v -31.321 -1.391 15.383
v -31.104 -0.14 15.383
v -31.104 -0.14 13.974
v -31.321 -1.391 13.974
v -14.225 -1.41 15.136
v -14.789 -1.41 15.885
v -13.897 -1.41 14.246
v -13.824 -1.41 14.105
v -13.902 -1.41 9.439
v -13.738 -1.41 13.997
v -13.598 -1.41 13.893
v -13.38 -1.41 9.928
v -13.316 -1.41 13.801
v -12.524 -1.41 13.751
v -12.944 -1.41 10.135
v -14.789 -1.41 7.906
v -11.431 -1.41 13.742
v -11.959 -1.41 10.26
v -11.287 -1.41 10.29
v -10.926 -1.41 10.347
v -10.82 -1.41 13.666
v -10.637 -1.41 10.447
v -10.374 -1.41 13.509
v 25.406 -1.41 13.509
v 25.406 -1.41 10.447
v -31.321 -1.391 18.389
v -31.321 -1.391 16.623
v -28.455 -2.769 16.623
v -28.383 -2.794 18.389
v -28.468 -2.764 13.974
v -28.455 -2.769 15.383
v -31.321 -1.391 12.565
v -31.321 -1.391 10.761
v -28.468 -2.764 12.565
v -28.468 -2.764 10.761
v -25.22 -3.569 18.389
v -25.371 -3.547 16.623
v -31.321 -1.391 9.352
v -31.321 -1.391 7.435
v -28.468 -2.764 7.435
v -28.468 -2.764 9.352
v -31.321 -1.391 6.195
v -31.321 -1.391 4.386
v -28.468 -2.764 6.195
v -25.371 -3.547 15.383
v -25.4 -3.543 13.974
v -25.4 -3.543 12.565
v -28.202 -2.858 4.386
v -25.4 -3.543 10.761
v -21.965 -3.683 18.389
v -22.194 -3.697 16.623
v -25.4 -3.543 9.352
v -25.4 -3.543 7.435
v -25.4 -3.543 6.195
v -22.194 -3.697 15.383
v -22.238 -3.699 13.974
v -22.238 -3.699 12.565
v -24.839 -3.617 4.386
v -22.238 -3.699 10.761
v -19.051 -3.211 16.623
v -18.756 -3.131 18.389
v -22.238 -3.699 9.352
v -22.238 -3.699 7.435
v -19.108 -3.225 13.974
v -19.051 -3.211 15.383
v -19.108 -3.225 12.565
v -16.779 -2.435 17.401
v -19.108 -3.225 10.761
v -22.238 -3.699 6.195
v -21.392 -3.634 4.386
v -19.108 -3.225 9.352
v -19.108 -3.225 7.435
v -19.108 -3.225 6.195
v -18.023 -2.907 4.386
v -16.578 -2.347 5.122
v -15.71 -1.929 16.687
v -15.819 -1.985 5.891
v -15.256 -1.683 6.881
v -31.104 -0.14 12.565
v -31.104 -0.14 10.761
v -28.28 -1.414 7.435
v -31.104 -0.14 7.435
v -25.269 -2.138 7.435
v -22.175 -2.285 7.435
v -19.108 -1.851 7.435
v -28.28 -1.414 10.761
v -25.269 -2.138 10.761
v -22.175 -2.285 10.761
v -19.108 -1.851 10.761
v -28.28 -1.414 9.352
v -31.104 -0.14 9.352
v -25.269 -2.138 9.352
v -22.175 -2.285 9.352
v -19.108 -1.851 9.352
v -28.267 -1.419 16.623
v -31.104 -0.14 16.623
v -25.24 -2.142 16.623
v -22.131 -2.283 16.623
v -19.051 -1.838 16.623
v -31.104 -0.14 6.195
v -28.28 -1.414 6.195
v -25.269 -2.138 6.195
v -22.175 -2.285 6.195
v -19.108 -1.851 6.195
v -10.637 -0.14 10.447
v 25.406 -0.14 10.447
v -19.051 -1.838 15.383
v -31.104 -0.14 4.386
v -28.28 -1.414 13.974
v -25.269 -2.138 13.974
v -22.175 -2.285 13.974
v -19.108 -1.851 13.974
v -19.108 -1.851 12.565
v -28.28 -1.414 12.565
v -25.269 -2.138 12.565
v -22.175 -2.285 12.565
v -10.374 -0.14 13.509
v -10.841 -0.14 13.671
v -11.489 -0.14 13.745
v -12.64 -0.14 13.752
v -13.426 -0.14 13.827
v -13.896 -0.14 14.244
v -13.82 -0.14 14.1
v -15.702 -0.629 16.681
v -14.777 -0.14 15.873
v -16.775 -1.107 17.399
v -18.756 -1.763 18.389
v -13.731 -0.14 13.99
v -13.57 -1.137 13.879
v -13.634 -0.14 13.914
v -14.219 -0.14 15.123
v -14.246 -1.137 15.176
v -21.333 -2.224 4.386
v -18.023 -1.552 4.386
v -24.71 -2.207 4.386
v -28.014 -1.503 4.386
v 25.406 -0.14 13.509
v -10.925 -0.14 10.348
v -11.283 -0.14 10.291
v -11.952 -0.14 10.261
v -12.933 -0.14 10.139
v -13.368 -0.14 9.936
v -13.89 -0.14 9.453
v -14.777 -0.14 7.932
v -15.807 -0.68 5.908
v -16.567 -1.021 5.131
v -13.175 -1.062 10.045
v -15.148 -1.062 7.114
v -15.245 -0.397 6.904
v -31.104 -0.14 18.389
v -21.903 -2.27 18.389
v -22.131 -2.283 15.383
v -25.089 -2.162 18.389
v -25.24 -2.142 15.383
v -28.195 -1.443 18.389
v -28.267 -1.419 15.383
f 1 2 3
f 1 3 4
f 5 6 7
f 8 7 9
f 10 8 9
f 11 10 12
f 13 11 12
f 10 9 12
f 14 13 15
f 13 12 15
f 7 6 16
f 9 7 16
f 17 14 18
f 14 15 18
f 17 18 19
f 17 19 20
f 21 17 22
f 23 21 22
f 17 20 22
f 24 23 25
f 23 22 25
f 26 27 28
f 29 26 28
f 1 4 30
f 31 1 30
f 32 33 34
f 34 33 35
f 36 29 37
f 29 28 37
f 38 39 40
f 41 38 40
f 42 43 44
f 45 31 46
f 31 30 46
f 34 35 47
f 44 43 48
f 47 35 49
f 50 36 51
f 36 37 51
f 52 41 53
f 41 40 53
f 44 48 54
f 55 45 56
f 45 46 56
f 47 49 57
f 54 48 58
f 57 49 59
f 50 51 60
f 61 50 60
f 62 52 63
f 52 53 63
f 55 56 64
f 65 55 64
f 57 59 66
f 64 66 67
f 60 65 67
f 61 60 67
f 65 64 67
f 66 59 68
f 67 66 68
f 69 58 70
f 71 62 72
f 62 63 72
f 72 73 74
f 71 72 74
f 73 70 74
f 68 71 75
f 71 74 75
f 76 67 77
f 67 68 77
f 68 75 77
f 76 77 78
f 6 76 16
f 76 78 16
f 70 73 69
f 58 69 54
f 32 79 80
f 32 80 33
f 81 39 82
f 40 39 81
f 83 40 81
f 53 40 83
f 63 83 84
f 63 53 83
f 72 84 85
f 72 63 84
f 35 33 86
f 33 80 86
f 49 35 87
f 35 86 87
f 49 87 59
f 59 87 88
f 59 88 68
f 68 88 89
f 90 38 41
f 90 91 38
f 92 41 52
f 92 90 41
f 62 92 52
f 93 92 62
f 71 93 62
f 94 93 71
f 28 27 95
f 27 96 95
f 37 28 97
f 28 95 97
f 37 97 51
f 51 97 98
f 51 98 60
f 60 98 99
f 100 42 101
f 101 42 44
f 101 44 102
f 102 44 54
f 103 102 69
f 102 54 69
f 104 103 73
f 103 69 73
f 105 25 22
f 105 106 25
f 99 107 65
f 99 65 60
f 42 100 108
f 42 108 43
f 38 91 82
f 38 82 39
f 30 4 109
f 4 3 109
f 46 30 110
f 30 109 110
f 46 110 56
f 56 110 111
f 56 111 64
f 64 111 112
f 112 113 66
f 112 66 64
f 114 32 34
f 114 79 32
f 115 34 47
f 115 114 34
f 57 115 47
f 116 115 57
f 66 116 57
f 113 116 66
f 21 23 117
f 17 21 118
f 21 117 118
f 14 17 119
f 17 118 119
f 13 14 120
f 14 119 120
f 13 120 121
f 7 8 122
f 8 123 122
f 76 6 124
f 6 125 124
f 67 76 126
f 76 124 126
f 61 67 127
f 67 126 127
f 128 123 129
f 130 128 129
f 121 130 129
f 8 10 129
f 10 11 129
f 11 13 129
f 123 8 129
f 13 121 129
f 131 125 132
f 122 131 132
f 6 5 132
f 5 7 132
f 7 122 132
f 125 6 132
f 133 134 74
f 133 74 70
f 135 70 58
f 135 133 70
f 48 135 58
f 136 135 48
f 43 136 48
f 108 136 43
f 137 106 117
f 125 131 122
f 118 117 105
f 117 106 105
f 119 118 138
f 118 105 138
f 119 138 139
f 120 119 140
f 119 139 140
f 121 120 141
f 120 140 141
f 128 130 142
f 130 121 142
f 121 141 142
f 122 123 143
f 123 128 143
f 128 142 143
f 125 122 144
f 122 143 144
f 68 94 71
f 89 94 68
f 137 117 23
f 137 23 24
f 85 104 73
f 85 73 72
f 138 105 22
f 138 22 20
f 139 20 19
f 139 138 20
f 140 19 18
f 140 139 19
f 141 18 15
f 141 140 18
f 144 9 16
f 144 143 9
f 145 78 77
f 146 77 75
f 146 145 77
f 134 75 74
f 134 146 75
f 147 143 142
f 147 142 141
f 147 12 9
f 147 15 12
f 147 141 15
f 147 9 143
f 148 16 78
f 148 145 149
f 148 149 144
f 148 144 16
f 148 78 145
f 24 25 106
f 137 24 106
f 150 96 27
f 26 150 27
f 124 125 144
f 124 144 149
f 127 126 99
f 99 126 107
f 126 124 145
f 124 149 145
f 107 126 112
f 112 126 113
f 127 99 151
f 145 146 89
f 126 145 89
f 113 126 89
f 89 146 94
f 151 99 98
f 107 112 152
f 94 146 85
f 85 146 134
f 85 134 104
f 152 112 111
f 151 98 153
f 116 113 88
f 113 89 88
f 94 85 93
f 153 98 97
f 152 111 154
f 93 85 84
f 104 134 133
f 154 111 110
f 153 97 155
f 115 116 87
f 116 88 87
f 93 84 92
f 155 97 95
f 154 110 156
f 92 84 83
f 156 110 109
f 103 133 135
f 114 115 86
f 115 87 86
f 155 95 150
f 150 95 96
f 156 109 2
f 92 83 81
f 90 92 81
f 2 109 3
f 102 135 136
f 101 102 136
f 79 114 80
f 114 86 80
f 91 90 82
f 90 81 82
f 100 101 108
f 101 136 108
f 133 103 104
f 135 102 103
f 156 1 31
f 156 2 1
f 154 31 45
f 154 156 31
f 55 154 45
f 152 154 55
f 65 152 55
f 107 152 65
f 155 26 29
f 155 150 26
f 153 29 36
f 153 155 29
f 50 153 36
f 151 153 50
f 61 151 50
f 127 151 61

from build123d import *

# Parameters (mm, degrees)
F1_DEPTH = 25.4
F2_W     = 12.7390697598
F2_H     = 1.2400867417
F2_W_2   = 12.2317634523
F2_H_2   = 1.4091897756
F2_W_3   = 12.4008655548
F2_W_4   = 12.2881308198
F2_H_3   = 1.2400858104
F3_DEPTH = 63.5


with BuildPart() as f1:
    # F0 (on Top) → F1 (new body)
    with BuildSketch(Plane.XY):
        with BuildLine():
            Line((25.4060197622, -1.4102543581), (25.4060197622, -0.1402543581))
            Line((25.4060197622, -0.1402543581), (-14.7767802378, -0.1402543581))
            ThreePointArc((-14.7767802378, -0.1402543581), (-22.940352015, -2.3026814229), (-31.1039237922, -0.1402543581))
            Line((-31.1039237922, -0.1402543581), (-31.3214249909, -1.3914910378))
            ThreePointArc((-31.3214249909, -1.3914910378), (-23.0576327568, -3.7192286192), (-14.7885782644, -1.4102543581))
            Line((-14.7885782644, -1.4102543581), (25.4060197622, -1.4102543581))
        make_face()
    extrude(amount=F1_DEPTH)

    # F2 (on Front) → F3 (cut, symmetric)
    with BuildSketch(Plane.XZ):
        with BuildLine():
            Line((-10.3737713591, 13.5085717124), (26.4562286409, 13.5085717124))
            Line((26.4562286409, 13.5085717124), (26.7456762769, 26.4659006628))
            Line((26.7456762769, 26.4659006628), (-32.1357277047, 26.4659006628))
            Line((-32.1357277047, 26.4659006628), (-32.1357277047, 18.3892324567))
            Line((-32.1357277047, 18.3892324567), (-18.7555998564, 18.3892324567))
            add(Edge.make_bspline(
                [(-10.3737713591, 13.5085717124), (-11.2232817613, 13.9691896047), (-14.0927804087, 13.3147734099), (-13.8045436235, 15.6054494371), (-16.9112439708, 17.6451656296), (-18.7555998564, 18.3892324567)],
                knots=[0, 0, 0, 0, 0.3348868544, 0.5606693294, 1, 1, 1, 1], degree=3))
        make_face()
        with BuildLine():
            Line((26.1932773025, -2.3347232873), (26.1932773025, 10.4465098237))
            Line((26.1932773025, 10.4465098237), (-10.6367226975, 10.4465098237))
            add(Edge.make_bspline(
                [(-10.6367226975, 10.4465098237), (-11.3411252296, 10.1161423857), (-13.6269139207, 10.7775876683), (-15.2153835526, 6.7761421787), (-16.1896712658, 5.0349102786), (-18.0228203535, 4.3864340605)],
                knots=[0, 0, 0, 0, 0.2928827632, 0.6363136149, 1, 1, 1, 1], degree=3))
            Line((-18.0228203535, 4.3864340605), (-31.7411561322, 4.3864340605))
            Line((-31.7411561322, 4.3864340605), (-32.1357277047, -2.3347232873))
            Line((-32.1357277047, -2.3347232873), (26.1932773025, -2.3347232873))
        make_face()
        with Locations((-25.4207216203, 16.0031258129)):
            Rectangle(F2_W, F2_H)
        with Locations((-25.2234358341, 13.2692987099)):
            Rectangle(F2_W_2, F2_H_2)
        with Locations((-25.3079868853, 10.0563466549)):
            Rectangle(F2_W_3, F2_H_2)
        with Locations((-25.2516195178, 6.8152113818)):
            Rectangle(F2_W_4, F2_H_3)
    extrude(amount=F3_DEPTH, both=True, mode=Mode.SUBTRACT)


solid = f1.part
